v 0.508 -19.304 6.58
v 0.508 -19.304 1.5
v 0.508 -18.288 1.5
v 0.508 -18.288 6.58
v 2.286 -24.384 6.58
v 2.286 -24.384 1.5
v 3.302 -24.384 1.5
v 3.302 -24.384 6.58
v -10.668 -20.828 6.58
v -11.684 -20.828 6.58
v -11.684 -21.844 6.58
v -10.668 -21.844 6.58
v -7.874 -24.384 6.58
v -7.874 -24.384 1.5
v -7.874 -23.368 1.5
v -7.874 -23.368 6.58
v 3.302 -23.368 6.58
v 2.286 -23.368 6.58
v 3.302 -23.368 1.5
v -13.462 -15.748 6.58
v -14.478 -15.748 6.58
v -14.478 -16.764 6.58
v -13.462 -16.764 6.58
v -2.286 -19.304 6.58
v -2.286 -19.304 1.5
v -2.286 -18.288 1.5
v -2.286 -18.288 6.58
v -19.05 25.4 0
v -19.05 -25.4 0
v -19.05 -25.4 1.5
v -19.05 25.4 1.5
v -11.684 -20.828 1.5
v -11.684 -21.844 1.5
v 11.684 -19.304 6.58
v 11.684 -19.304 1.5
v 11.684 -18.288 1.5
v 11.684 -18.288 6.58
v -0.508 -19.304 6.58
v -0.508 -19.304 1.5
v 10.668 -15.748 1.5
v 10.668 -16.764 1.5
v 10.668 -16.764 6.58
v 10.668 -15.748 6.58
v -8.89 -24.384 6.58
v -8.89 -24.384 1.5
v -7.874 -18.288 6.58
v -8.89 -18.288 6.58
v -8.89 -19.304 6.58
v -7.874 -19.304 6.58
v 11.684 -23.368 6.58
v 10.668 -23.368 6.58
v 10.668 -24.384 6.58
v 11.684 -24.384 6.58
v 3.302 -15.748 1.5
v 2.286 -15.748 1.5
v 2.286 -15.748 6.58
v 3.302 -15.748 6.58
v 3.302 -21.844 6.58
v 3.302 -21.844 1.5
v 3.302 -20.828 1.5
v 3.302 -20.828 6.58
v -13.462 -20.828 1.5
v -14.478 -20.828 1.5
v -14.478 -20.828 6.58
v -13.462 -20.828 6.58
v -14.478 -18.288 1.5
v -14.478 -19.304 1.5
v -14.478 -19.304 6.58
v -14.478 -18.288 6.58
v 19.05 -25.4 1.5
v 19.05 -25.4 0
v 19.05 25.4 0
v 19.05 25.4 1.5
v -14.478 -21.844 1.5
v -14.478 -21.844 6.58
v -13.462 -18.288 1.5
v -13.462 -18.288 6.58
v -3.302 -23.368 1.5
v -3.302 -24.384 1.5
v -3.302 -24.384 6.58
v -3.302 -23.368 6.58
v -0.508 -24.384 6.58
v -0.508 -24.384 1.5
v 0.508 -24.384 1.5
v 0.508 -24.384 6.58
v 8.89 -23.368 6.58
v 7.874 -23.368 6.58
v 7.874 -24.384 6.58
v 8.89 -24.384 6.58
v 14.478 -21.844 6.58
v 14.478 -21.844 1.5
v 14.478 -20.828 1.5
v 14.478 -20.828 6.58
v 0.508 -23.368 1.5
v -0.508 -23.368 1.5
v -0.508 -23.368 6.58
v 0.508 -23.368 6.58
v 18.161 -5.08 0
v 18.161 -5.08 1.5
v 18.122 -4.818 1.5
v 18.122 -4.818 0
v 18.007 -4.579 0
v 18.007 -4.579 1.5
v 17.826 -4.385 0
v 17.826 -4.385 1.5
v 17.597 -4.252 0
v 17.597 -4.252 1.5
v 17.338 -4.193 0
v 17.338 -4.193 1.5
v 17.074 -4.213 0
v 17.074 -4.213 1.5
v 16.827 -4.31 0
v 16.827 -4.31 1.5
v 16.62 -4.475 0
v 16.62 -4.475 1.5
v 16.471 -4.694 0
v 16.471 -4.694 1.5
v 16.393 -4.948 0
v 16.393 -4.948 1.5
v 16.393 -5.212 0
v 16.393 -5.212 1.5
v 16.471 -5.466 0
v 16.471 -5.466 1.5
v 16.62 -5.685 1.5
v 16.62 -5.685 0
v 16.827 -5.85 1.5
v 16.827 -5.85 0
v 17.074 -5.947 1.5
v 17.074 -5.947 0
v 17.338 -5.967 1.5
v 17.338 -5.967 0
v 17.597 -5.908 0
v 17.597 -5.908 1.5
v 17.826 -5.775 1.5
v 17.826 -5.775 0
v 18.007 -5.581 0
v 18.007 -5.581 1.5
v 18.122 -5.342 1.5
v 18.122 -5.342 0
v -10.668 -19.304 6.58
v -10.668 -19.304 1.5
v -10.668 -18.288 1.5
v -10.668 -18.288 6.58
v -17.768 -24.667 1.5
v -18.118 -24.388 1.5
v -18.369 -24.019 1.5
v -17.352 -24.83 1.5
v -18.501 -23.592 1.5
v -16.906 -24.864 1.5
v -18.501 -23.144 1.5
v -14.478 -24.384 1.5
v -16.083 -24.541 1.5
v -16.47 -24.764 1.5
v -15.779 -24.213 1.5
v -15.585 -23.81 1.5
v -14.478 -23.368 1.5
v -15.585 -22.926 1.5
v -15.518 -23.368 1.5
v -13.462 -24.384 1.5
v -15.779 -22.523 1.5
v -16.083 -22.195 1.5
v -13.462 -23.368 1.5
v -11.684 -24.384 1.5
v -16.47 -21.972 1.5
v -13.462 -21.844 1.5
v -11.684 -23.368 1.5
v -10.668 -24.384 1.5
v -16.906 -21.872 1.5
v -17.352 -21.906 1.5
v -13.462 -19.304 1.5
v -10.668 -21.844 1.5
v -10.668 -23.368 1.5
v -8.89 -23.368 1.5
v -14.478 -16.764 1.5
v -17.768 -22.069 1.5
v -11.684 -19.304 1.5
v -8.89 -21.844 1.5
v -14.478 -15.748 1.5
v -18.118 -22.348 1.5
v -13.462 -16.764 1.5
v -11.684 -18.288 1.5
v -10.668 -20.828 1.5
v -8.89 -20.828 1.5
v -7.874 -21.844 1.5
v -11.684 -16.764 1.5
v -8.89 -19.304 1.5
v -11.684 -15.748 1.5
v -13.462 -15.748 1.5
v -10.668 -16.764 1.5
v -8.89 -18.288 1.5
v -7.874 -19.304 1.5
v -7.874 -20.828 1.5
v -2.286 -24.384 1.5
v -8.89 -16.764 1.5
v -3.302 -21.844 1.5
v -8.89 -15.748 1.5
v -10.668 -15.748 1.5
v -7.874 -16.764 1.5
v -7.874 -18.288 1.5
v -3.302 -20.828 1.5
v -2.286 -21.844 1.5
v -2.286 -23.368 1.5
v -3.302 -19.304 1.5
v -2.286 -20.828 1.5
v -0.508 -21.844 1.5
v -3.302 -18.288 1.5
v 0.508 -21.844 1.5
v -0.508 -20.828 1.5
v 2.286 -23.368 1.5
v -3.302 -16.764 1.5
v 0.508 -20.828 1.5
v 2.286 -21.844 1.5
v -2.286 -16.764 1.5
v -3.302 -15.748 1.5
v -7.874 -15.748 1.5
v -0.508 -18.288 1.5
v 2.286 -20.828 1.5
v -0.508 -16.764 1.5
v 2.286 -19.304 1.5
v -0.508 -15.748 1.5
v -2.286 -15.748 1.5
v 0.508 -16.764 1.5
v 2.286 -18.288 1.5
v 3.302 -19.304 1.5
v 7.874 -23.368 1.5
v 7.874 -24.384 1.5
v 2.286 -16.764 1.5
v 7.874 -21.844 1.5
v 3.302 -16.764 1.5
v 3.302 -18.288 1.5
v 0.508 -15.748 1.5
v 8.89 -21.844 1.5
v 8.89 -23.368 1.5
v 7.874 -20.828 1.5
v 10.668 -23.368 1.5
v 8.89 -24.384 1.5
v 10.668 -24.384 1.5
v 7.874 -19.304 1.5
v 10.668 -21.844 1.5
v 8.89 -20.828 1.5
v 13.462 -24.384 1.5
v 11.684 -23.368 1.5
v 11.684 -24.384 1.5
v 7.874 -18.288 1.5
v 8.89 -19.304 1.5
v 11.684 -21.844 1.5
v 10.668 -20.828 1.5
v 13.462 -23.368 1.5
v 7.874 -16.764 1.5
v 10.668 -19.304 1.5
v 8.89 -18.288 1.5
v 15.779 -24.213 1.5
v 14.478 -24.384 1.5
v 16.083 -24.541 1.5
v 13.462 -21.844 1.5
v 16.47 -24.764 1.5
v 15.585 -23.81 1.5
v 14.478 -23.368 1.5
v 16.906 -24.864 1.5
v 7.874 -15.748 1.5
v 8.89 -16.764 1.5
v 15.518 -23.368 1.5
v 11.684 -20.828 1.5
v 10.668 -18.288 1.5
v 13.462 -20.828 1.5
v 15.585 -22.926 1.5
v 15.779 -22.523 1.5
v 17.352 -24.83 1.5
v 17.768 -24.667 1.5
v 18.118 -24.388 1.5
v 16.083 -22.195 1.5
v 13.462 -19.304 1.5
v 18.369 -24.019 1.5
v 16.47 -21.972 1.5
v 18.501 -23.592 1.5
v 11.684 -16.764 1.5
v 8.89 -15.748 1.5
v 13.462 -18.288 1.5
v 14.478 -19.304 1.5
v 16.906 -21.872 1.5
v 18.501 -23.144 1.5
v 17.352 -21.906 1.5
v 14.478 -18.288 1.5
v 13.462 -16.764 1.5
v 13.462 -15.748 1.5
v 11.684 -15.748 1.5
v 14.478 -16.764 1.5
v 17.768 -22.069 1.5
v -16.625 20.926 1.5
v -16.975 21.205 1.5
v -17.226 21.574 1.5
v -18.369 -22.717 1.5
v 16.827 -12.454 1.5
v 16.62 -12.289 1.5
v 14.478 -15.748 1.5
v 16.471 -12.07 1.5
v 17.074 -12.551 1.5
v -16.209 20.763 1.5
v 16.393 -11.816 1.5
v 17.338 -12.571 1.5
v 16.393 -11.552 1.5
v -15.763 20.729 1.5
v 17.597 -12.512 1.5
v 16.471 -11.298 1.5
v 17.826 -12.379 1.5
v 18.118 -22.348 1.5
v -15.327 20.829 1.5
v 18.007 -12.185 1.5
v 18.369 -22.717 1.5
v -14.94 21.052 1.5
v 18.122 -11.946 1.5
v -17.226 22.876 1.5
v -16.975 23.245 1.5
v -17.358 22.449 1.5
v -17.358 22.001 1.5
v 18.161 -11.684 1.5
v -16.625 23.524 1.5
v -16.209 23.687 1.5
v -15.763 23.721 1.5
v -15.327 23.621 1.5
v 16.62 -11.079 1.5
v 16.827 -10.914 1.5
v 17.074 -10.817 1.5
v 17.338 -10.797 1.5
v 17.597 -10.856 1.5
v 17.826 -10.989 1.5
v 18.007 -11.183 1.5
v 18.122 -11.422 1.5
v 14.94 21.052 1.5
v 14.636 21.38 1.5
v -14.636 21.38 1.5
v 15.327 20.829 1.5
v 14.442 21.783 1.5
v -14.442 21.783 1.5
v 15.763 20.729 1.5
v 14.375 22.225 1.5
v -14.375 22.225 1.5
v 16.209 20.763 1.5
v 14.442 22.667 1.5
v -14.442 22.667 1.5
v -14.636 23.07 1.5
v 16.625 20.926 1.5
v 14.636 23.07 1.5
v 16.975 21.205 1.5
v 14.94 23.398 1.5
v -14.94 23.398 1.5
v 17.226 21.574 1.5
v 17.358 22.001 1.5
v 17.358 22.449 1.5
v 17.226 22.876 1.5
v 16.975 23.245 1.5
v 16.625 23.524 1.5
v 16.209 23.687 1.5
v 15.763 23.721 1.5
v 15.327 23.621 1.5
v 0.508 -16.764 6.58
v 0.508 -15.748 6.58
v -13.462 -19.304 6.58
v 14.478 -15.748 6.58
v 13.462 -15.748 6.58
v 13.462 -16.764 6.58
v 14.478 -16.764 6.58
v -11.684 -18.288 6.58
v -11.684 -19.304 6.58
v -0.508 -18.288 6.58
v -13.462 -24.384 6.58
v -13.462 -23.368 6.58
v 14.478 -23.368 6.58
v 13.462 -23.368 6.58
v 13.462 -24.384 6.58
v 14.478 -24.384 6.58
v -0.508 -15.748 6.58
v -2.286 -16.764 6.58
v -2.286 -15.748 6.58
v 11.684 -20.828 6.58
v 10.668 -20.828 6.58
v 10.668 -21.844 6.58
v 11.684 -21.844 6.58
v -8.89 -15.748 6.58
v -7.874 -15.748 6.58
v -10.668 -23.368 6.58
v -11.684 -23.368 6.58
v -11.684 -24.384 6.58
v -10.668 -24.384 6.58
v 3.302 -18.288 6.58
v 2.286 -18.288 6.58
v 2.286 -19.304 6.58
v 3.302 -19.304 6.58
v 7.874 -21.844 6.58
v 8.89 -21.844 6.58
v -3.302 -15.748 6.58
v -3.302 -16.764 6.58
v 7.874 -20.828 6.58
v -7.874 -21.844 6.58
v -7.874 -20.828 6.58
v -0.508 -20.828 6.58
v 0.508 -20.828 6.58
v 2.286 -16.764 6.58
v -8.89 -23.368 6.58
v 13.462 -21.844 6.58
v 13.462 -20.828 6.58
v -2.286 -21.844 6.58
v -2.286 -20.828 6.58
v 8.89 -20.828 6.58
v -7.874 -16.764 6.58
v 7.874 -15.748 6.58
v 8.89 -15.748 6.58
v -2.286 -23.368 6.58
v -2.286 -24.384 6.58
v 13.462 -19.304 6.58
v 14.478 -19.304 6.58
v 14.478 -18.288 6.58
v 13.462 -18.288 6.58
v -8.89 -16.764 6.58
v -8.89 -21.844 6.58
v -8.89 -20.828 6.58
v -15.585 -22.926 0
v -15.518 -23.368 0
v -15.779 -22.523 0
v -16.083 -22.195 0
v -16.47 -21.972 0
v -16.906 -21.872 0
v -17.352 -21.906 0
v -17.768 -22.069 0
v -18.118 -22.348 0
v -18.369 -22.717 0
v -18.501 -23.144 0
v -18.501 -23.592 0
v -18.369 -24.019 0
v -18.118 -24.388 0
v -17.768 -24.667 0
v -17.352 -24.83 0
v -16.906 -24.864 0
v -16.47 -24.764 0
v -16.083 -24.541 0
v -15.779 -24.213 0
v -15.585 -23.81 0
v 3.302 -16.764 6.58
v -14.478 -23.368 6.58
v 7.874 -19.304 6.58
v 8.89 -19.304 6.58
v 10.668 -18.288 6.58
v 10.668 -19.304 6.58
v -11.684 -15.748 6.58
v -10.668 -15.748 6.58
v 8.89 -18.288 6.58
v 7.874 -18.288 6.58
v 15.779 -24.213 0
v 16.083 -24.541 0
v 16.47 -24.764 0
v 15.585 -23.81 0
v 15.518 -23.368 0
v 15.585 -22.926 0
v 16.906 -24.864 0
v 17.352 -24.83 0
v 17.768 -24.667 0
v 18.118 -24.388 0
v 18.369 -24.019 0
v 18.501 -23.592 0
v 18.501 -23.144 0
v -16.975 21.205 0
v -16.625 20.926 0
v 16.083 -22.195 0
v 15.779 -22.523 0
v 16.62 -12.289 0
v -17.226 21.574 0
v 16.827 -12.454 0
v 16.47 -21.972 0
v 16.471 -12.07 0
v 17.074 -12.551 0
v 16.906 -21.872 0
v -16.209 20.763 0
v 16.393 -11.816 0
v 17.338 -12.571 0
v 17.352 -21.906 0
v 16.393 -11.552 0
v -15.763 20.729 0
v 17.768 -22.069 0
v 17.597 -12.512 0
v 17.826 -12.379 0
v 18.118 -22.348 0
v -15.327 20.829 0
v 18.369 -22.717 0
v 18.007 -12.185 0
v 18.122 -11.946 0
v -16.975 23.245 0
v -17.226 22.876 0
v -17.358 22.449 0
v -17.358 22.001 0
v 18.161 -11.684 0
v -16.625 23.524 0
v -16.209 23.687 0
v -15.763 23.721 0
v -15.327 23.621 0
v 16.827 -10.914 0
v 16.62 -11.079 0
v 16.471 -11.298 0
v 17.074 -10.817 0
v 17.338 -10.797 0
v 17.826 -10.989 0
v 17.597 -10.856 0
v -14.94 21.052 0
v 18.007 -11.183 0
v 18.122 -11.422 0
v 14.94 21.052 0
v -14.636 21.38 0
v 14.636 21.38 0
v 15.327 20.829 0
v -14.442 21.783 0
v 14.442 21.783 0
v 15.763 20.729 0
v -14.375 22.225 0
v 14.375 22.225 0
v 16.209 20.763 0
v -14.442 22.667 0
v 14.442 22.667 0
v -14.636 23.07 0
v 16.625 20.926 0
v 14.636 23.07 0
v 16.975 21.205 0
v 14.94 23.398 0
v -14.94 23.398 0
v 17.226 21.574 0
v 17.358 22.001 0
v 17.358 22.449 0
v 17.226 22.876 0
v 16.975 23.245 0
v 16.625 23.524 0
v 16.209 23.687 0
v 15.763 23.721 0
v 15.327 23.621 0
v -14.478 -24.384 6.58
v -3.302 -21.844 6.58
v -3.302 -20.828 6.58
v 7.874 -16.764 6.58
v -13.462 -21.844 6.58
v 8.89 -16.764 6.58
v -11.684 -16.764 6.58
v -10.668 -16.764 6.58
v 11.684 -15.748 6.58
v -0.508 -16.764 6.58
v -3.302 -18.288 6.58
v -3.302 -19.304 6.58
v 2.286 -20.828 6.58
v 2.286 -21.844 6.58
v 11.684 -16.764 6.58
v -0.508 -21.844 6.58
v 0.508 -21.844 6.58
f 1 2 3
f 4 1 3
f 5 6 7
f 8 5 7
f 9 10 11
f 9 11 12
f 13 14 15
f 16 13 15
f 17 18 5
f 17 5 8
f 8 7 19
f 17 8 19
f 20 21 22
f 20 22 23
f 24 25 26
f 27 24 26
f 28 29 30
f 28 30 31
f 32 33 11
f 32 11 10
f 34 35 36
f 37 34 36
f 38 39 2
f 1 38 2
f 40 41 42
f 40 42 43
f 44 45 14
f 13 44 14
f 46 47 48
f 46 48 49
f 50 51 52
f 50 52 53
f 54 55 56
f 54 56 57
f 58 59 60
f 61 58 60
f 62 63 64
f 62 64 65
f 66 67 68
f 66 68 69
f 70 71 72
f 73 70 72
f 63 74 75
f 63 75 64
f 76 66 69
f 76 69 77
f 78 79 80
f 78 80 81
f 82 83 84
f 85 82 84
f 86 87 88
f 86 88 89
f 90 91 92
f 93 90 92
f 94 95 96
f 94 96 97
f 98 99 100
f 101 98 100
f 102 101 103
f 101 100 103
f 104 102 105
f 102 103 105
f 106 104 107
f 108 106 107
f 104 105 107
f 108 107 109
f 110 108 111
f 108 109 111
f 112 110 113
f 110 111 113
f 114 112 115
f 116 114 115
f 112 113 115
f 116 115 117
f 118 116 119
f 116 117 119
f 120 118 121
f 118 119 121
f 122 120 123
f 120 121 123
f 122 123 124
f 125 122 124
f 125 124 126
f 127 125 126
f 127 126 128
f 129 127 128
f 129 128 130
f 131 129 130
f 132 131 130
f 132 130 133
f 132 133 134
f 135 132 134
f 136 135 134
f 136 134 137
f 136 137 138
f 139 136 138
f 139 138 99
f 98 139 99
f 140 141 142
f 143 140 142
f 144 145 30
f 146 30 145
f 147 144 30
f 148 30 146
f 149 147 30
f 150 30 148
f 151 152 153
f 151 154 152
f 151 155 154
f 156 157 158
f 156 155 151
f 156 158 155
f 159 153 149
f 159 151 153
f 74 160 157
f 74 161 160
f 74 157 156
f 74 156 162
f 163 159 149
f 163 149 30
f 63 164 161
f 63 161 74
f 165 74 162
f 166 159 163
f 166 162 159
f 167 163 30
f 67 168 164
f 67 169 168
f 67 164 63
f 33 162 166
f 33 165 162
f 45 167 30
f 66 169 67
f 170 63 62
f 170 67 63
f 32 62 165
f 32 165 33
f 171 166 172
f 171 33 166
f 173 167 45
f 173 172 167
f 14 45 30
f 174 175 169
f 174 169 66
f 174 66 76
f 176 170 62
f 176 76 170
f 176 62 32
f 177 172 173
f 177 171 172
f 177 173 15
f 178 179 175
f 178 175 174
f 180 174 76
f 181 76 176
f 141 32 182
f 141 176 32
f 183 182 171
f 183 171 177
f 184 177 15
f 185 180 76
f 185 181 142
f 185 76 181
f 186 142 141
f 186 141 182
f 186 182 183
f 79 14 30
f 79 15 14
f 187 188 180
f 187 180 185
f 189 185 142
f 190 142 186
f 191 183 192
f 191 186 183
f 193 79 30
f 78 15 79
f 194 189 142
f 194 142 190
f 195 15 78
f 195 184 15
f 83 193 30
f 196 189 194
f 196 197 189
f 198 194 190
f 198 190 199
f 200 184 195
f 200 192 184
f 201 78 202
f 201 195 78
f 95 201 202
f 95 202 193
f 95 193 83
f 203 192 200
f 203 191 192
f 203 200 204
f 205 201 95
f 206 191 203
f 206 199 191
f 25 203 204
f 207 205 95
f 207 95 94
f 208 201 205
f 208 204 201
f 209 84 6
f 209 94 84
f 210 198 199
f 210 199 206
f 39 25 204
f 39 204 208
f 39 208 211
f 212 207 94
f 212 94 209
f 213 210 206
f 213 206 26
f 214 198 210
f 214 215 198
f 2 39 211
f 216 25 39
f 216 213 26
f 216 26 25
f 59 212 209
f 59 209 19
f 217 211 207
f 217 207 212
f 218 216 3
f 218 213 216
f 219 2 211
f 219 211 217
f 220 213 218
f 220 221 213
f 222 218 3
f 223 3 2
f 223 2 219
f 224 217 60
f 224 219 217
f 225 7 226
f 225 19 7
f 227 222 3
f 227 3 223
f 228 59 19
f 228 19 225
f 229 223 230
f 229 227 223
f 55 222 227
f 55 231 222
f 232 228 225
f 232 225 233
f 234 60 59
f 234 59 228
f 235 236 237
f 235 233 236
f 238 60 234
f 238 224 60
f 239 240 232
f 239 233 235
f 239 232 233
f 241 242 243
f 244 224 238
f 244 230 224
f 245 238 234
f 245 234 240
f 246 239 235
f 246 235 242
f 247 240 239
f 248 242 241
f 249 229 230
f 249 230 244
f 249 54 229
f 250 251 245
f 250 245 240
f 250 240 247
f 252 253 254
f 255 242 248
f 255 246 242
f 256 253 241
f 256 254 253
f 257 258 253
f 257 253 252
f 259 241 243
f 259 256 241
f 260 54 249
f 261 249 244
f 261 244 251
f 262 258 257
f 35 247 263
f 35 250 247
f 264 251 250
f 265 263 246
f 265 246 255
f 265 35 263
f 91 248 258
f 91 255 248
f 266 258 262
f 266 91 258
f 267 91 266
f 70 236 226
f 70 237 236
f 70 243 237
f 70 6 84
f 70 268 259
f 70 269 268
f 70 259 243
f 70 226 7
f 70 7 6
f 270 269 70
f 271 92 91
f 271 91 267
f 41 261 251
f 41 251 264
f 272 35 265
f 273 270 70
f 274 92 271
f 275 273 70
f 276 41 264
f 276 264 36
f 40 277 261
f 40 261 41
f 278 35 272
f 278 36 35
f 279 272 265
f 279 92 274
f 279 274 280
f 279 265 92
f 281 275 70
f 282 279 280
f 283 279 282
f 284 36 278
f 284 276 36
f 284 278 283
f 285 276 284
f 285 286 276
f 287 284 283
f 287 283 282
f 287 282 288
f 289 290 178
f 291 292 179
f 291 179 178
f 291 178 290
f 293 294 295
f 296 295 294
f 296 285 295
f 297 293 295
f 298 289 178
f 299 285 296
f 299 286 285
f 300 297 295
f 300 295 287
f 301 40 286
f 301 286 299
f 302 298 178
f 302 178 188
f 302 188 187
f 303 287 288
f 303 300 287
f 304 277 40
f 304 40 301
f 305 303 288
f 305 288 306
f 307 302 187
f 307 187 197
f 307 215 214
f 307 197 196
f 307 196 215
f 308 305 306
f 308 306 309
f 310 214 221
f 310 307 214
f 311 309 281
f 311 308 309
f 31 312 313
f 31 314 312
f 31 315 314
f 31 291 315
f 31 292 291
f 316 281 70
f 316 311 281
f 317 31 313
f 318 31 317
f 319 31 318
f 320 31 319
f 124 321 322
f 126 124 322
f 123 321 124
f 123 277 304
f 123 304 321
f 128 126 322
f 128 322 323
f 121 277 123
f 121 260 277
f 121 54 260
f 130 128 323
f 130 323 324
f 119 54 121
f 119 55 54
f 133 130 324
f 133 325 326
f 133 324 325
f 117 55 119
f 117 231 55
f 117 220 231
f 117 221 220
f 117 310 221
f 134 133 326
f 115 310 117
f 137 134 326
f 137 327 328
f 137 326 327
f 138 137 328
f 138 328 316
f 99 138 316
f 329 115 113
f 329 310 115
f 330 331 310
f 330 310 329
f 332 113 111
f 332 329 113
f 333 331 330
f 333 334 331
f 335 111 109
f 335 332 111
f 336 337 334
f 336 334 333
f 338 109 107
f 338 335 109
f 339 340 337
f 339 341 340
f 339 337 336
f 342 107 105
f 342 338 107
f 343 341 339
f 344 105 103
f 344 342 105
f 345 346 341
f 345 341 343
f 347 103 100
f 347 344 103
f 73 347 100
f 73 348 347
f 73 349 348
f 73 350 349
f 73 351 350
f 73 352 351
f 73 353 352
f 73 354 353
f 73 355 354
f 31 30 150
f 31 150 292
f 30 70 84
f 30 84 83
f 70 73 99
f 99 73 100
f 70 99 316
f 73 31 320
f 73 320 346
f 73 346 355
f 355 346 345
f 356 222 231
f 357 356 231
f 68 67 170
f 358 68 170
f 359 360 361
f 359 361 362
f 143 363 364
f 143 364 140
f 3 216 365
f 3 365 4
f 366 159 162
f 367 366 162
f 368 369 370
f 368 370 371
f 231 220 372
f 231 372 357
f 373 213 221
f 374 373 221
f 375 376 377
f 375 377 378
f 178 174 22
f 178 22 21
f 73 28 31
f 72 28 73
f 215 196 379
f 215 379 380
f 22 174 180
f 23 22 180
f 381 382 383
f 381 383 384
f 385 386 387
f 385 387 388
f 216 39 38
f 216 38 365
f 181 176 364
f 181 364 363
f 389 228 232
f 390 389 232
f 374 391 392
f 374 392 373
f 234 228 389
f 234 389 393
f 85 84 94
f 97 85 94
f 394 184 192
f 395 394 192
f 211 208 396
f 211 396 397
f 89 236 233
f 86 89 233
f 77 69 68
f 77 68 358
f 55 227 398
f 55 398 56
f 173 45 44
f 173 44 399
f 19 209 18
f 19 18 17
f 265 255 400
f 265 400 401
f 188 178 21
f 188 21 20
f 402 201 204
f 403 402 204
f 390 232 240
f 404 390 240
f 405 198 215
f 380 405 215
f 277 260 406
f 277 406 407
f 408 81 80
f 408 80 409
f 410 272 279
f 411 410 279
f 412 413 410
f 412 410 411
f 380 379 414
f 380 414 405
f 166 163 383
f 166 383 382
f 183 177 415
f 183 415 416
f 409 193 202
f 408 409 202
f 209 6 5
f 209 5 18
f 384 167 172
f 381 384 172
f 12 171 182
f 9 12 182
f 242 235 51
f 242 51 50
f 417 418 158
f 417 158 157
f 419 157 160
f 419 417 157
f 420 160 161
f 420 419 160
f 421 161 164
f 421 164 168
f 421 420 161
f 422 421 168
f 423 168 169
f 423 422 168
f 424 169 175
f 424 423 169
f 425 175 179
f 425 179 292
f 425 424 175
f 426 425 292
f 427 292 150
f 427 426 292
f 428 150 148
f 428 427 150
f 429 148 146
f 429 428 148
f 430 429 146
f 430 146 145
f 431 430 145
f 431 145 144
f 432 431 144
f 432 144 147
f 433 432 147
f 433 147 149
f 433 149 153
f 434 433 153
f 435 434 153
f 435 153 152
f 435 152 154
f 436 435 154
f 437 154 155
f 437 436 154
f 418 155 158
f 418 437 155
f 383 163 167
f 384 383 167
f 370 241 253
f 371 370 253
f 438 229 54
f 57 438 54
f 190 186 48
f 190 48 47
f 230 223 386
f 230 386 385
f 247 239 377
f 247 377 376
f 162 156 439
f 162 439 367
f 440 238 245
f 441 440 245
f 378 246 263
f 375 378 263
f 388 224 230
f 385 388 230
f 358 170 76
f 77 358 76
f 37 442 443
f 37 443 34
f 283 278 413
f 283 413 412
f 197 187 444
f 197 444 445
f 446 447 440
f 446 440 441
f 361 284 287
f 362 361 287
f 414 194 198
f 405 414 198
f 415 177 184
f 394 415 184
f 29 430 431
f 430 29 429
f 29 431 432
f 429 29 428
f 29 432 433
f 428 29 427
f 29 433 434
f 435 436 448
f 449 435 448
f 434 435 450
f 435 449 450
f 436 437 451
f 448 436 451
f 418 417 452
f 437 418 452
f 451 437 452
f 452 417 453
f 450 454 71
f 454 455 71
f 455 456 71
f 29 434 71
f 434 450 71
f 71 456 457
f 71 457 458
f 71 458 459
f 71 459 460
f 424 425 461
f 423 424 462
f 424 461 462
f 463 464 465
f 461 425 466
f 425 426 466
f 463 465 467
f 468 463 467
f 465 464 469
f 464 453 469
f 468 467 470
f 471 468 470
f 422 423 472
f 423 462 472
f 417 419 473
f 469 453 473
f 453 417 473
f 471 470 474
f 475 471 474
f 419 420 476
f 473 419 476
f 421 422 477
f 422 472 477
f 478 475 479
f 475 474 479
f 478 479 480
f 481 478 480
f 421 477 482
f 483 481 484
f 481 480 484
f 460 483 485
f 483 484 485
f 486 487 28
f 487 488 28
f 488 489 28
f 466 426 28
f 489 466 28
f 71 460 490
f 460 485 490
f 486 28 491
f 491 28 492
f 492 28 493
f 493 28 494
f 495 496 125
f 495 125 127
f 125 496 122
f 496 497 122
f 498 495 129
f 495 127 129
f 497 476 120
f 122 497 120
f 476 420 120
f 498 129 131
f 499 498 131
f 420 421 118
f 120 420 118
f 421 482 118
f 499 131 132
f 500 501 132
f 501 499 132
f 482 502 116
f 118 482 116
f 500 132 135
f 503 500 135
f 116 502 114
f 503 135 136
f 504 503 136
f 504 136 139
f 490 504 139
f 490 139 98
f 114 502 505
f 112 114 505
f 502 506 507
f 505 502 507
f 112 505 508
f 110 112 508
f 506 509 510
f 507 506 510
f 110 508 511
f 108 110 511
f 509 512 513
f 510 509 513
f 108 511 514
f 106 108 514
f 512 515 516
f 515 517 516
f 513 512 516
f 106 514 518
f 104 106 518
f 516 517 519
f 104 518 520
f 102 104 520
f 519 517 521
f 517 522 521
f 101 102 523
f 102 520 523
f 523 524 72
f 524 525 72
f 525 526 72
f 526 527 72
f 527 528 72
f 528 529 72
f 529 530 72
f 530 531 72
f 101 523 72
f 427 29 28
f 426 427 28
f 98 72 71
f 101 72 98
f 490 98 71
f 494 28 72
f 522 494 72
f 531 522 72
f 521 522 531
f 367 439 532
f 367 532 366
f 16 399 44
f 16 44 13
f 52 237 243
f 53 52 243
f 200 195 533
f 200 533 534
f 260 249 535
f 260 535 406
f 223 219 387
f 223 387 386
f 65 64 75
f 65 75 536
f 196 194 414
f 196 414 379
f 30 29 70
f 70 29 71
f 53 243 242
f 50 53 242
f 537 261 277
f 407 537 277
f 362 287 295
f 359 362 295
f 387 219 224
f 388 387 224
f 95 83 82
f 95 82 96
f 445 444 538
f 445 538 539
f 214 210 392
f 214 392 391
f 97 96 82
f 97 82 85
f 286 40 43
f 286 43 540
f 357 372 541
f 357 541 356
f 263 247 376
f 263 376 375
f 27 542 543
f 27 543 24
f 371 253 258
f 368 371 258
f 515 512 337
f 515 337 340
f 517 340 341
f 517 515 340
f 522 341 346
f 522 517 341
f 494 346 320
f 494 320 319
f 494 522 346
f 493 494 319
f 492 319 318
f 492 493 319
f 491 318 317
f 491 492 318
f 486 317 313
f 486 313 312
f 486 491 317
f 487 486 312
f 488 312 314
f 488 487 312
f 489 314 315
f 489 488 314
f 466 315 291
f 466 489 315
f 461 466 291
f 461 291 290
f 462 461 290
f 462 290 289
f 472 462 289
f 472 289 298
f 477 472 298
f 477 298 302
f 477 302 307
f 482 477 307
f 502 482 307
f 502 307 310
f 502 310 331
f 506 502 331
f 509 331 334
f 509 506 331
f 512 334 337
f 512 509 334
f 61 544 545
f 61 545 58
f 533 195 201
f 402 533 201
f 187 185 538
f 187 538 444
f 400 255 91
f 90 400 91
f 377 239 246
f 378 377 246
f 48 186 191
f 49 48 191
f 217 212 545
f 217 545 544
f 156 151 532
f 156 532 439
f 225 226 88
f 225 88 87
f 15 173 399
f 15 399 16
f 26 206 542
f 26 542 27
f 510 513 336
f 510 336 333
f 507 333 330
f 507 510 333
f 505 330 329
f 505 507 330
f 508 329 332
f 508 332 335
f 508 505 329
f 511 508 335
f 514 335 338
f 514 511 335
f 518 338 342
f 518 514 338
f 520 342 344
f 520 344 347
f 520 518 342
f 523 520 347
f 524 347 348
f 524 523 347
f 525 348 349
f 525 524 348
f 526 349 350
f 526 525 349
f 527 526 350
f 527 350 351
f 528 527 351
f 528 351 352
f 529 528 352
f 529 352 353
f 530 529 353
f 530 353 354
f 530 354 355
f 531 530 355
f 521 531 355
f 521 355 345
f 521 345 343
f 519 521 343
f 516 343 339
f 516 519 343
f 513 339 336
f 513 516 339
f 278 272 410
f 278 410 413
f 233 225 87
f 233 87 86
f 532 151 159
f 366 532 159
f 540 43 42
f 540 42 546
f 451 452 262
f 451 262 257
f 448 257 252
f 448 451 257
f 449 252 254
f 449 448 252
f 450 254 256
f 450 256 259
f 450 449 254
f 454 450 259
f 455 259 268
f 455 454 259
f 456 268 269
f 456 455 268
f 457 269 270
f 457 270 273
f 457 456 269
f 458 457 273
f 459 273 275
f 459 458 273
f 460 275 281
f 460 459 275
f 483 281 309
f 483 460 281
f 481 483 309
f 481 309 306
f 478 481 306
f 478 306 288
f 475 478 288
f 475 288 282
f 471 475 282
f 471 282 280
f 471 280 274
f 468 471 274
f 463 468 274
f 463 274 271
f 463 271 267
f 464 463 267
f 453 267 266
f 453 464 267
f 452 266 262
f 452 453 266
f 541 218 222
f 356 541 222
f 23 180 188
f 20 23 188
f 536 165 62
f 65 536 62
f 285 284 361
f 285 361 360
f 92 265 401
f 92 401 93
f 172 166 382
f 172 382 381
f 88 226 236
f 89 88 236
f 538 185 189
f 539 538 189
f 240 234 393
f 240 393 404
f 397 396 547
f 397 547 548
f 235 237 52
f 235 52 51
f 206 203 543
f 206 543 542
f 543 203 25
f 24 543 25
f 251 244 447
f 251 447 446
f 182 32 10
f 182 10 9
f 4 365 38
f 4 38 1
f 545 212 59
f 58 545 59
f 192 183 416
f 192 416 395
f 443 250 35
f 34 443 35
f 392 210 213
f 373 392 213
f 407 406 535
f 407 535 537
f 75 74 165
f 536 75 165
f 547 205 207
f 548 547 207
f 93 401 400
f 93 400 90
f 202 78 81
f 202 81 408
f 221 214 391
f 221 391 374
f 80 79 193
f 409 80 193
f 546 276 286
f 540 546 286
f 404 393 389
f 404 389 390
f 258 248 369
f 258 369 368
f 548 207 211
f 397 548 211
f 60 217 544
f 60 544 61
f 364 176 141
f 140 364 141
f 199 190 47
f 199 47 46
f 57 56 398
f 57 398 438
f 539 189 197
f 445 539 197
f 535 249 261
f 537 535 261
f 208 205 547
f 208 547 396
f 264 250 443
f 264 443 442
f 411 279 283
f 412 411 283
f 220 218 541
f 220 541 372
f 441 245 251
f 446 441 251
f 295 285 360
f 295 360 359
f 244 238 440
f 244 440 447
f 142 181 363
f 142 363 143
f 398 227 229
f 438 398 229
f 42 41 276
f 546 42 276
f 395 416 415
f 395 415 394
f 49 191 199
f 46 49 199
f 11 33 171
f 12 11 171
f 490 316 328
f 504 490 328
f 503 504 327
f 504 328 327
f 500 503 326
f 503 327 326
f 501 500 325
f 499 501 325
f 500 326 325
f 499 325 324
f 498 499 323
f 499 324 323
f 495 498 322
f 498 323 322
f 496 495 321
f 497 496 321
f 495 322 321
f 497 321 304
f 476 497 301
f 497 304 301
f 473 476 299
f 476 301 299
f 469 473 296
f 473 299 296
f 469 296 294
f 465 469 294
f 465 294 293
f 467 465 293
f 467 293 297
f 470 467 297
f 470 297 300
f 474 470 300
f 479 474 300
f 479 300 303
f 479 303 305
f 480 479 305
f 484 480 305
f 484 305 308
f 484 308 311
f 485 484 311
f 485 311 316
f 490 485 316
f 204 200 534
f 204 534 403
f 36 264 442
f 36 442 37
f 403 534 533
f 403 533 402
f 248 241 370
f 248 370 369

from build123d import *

# Parameters (mm, degrees)
SKETCH1_W           = 38.1
SKETCH1_H           = 50.8
SKETCH1_R           = 1.5
BOSS_EXTRUDE1_DEPTH = 1.5
SKETCH2_R           = 0.889
CUT_EXTRUDE1_DEPTH  = 32.785413321
SKETCH3_W           = 1.016
SKETCH3_H           = 1.016
BOSS_EXTRUDE2_DEPTH = 5.08


with BuildPart() as part:
    # Sketch1 → Boss-Extrude1 (new body)
    with BuildSketch(Plane.XY):
        Rectangle(SKETCH1_W, SKETCH1_H)
        with Locations((-17.018, -23.368)):
            Circle(SKETCH1_R, mode=Mode.SUBTRACT)
        with Locations((-15.875, 22.225)):
            Circle(SKETCH1_R, mode=Mode.SUBTRACT)
        with Locations(Location((17.018, -23.368, 0), (0, 0, 180))):
            Circle(SKETCH1_R, mode=Mode.SUBTRACT)
        with Locations(Location((15.875, 22.225, 0), (0, 0, 180))):
            Circle(SKETCH1_R, mode=Mode.SUBTRACT)
    extrude(amount=BOSS_EXTRUDE1_DEPTH)

    # Sketch2 → Cut-Extrude1 (cut, through all)
    with BuildSketch(Plane.XY.offset(1.5)):
        with Locations((17.272, -11.684)):
            Circle(SKETCH2_R)
        with Locations((17.272, -5.08)):
            Circle(SKETCH2_R)
    extrude(amount=-CUT_EXTRUDE1_DEPTH, mode=Mode.SUBTRACT)

    # Sketch3 → Boss-Extrude2 (add)
    with BuildSketch(Plane.XY.offset(1.5)):
        with Locations((-13.97, -23.876)):
            Rectangle(SKETCH3_W, SKETCH3_H)
        with Locations((-13.97, -21.336)):
            Rectangle(SKETCH3_W, SKETCH3_H)
        with Locations((-13.97, -18.796)):
            Rectangle(SKETCH3_W, SKETCH3_H)
        with Locations((-13.97, -16.256)):
            Rectangle(SKETCH3_W, SKETCH3_H)
        with Locations((-11.176, -23.876)):
            Rectangle(SKETCH3_W, SKETCH3_H)
        with Locations((-11.176, -21.336)):
            Rectangle(SKETCH3_W, SKETCH3_H)
        with Locations((-11.176, -18.796)):
            Rectangle(SKETCH3_W, SKETCH3_H)
        with Locations((-11.176, -16.256)):
            Rectangle(SKETCH3_W, SKETCH3_H)
        with Locations((-8.382, -23.876)):
            Rectangle(SKETCH3_W, SKETCH3_H)
        with Locations((-8.382, -21.336)):
            Rectangle(SKETCH3_W, SKETCH3_H)
        with Locations((-8.382, -18.796)):
            Rectangle(SKETCH3_W, SKETCH3_H)
        with Locations((-8.382, -16.256)):
            Rectangle(SKETCH3_W, SKETCH3_H)
        with Locations((-2.794, -23.876)):
            Rectangle(SKETCH3_W, SKETCH3_H)
        with Locations((-2.794, -21.336)):
            Rectangle(SKETCH3_W, SKETCH3_H)
        with Locations((-2.794, -18.796)):
            Rectangle(SKETCH3_W, SKETCH3_H)
        with Locations((-2.794, -16.256)):
            Rectangle(SKETCH3_W, SKETCH3_H)
        with Locations((0, -23.876)):
            Rectangle(SKETCH3_W, SKETCH3_H)
        with Locations((0, -21.336)):
            Rectangle(SKETCH3_W, SKETCH3_H)
        with Locations((0, -18.796)):
            Rectangle(SKETCH3_W, SKETCH3_H)
        with Locations((0, -16.256)):
            Rectangle(SKETCH3_W, SKETCH3_H)
        with Locations((2.794, -23.876)):
            Rectangle(SKETCH3_W, SKETCH3_H)
        with Locations((2.794, -21.336)):
            Rectangle(SKETCH3_W, SKETCH3_H)
        with Locations((2.794, -18.796)):
            Rectangle(SKETCH3_W, SKETCH3_H)
        with Locations((2.794, -16.256)):
            Rectangle(SKETCH3_W, SKETCH3_H)
        with Locations((8.382, -23.876)):
            Rectangle(SKETCH3_W, SKETCH3_H)
        with Locations((8.382, -21.336)):
            Rectangle(SKETCH3_W, SKETCH3_H)
        with Locations((8.382, -18.796)):
            Rectangle(SKETCH3_W, SKETCH3_H)
        with Locations((8.382, -16.256)):
            Rectangle(SKETCH3_W, SKETCH3_H)
        with Locations((11.176, -23.876)):
            Rectangle(SKETCH3_W, SKETCH3_H)
        with Locations((11.176, -21.336)):
            Rectangle(SKETCH3_W, SKETCH3_H)
        with Locations((11.176, -18.796)):
            Rectangle(SKETCH3_W, SKETCH3_H)
        with Locations((11.176, -16.256)):
            Rectangle(SKETCH3_W, SKETCH3_H)
        with Locations((13.97, -23.876)):
            Rectangle(SKETCH3_W, SKETCH3_H)
        with Locations((13.97, -21.336)):
            Rectangle(SKETCH3_W, SKETCH3_H)
        with Locations((13.97, -18.796)):
            Rectangle(SKETCH3_W, SKETCH3_H)
        with Locations((13.97, -16.256)):
            Rectangle(SKETCH3_W, SKETCH3_H)
    extrude(amount=BOSS_EXTRUDE2_DEPTH)


solid = part.part
